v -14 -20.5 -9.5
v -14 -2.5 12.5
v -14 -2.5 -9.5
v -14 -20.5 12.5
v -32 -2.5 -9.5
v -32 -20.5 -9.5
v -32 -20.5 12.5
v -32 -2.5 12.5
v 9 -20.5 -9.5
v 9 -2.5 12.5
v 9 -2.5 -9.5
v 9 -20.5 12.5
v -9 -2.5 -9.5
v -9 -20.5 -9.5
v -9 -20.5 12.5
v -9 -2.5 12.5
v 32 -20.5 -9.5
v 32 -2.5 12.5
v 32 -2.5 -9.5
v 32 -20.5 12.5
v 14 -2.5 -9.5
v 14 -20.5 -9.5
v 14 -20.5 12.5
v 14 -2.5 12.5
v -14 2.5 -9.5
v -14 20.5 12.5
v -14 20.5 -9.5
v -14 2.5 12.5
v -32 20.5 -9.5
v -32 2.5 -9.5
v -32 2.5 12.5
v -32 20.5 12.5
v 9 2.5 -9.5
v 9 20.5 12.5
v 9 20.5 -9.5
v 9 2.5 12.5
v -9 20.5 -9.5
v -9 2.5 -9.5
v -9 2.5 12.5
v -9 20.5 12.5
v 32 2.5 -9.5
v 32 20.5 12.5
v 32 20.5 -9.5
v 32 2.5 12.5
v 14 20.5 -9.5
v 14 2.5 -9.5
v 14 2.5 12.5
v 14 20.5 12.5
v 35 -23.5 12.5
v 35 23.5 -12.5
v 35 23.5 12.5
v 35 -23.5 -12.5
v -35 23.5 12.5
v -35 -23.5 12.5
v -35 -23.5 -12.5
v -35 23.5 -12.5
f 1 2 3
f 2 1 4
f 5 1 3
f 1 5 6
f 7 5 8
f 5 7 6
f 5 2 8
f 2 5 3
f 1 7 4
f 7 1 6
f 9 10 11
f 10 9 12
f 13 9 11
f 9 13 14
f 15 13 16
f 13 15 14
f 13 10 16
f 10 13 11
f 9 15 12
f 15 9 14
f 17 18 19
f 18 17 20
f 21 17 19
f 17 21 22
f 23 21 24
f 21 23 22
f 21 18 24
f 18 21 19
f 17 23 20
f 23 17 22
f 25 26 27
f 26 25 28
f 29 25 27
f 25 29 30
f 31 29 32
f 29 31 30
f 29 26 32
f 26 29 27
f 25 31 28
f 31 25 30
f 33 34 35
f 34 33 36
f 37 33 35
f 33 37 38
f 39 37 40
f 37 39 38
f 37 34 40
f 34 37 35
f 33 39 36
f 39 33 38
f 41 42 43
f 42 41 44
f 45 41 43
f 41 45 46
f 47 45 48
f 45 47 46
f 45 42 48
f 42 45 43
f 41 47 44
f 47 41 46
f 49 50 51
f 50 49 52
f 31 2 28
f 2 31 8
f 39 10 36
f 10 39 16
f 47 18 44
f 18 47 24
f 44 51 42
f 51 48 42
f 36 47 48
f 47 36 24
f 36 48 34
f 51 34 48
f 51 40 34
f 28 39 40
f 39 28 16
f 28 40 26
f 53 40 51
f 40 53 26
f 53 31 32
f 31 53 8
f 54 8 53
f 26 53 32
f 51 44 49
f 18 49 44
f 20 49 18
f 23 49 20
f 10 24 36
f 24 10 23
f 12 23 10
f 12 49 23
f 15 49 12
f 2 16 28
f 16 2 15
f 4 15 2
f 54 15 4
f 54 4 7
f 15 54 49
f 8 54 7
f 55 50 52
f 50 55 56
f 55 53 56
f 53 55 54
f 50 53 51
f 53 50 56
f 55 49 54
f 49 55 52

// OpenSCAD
$fn = 32;

// ----------------------------------------------------------------------
// Pocket plate 70 x 47 x 25
// 2 x 3 pockets 18 mm square, 22 mm deep
// ----------------------------------------------------------------------

// --- parameters (mm) ---
thickness = 25;  // plate thickness
floor_t = 3;     // material left under each pocket
pocket = 18;     // pocket side length
pitch_x = 23;    // pocket pitch along X
pitch_y = 23;    // pocket pitch along Y
cols = 3;        // pockets per row
rows = 2;        // rows of pockets

// --- derived feature positions (mm) ---
depth = thickness - floor_t;        // = 22   pocket depth, down to the floor
span_x = (cols - 1) * pitch_x;      // = 46   distance between outer pockets
span_y = (rows - 1) * pitch_y;      // = 23   distance between outer pocket rows
origin_x = -span_x / 2;             // = -23   X of the first pocket
origin_y = -span_y / 2;             // = -11.5   Y of the first pocket
plate = [span_x + pocket + 6, span_y + pocket + 6, thickness];  // = [70, 47, 25]   overall size: pockets plus 3 mm of wall on each side
feature_centers = [
  [origin_x + 0 * pitch_x, origin_y + 0 * pitch_y],
  [origin_x + 1 * pitch_x, origin_y + 0 * pitch_y],
  [origin_x + 2 * pitch_x, origin_y + 0 * pitch_y],
  [origin_x + 0 * pitch_x, origin_y + 1 * pitch_y],
  [origin_x + 1 * pitch_x, origin_y + 1 * pitch_y],
  [origin_x + 2 * pitch_x, origin_y + 1 * pitch_y]
];   // pocket centres, used verbatim by the cutter loop

// plate outline, then one pocket per centre in feature_centers
difference() {
  cube(plate, center = true);
  for (centre = feature_centers)
    translate([centre[0] - pocket / 2, centre[1] - pocket / 2, plate[2] / 2 - depth])
      cube([pocket, pocket, depth + 1]);  // centred on the declared pocket centre
}
